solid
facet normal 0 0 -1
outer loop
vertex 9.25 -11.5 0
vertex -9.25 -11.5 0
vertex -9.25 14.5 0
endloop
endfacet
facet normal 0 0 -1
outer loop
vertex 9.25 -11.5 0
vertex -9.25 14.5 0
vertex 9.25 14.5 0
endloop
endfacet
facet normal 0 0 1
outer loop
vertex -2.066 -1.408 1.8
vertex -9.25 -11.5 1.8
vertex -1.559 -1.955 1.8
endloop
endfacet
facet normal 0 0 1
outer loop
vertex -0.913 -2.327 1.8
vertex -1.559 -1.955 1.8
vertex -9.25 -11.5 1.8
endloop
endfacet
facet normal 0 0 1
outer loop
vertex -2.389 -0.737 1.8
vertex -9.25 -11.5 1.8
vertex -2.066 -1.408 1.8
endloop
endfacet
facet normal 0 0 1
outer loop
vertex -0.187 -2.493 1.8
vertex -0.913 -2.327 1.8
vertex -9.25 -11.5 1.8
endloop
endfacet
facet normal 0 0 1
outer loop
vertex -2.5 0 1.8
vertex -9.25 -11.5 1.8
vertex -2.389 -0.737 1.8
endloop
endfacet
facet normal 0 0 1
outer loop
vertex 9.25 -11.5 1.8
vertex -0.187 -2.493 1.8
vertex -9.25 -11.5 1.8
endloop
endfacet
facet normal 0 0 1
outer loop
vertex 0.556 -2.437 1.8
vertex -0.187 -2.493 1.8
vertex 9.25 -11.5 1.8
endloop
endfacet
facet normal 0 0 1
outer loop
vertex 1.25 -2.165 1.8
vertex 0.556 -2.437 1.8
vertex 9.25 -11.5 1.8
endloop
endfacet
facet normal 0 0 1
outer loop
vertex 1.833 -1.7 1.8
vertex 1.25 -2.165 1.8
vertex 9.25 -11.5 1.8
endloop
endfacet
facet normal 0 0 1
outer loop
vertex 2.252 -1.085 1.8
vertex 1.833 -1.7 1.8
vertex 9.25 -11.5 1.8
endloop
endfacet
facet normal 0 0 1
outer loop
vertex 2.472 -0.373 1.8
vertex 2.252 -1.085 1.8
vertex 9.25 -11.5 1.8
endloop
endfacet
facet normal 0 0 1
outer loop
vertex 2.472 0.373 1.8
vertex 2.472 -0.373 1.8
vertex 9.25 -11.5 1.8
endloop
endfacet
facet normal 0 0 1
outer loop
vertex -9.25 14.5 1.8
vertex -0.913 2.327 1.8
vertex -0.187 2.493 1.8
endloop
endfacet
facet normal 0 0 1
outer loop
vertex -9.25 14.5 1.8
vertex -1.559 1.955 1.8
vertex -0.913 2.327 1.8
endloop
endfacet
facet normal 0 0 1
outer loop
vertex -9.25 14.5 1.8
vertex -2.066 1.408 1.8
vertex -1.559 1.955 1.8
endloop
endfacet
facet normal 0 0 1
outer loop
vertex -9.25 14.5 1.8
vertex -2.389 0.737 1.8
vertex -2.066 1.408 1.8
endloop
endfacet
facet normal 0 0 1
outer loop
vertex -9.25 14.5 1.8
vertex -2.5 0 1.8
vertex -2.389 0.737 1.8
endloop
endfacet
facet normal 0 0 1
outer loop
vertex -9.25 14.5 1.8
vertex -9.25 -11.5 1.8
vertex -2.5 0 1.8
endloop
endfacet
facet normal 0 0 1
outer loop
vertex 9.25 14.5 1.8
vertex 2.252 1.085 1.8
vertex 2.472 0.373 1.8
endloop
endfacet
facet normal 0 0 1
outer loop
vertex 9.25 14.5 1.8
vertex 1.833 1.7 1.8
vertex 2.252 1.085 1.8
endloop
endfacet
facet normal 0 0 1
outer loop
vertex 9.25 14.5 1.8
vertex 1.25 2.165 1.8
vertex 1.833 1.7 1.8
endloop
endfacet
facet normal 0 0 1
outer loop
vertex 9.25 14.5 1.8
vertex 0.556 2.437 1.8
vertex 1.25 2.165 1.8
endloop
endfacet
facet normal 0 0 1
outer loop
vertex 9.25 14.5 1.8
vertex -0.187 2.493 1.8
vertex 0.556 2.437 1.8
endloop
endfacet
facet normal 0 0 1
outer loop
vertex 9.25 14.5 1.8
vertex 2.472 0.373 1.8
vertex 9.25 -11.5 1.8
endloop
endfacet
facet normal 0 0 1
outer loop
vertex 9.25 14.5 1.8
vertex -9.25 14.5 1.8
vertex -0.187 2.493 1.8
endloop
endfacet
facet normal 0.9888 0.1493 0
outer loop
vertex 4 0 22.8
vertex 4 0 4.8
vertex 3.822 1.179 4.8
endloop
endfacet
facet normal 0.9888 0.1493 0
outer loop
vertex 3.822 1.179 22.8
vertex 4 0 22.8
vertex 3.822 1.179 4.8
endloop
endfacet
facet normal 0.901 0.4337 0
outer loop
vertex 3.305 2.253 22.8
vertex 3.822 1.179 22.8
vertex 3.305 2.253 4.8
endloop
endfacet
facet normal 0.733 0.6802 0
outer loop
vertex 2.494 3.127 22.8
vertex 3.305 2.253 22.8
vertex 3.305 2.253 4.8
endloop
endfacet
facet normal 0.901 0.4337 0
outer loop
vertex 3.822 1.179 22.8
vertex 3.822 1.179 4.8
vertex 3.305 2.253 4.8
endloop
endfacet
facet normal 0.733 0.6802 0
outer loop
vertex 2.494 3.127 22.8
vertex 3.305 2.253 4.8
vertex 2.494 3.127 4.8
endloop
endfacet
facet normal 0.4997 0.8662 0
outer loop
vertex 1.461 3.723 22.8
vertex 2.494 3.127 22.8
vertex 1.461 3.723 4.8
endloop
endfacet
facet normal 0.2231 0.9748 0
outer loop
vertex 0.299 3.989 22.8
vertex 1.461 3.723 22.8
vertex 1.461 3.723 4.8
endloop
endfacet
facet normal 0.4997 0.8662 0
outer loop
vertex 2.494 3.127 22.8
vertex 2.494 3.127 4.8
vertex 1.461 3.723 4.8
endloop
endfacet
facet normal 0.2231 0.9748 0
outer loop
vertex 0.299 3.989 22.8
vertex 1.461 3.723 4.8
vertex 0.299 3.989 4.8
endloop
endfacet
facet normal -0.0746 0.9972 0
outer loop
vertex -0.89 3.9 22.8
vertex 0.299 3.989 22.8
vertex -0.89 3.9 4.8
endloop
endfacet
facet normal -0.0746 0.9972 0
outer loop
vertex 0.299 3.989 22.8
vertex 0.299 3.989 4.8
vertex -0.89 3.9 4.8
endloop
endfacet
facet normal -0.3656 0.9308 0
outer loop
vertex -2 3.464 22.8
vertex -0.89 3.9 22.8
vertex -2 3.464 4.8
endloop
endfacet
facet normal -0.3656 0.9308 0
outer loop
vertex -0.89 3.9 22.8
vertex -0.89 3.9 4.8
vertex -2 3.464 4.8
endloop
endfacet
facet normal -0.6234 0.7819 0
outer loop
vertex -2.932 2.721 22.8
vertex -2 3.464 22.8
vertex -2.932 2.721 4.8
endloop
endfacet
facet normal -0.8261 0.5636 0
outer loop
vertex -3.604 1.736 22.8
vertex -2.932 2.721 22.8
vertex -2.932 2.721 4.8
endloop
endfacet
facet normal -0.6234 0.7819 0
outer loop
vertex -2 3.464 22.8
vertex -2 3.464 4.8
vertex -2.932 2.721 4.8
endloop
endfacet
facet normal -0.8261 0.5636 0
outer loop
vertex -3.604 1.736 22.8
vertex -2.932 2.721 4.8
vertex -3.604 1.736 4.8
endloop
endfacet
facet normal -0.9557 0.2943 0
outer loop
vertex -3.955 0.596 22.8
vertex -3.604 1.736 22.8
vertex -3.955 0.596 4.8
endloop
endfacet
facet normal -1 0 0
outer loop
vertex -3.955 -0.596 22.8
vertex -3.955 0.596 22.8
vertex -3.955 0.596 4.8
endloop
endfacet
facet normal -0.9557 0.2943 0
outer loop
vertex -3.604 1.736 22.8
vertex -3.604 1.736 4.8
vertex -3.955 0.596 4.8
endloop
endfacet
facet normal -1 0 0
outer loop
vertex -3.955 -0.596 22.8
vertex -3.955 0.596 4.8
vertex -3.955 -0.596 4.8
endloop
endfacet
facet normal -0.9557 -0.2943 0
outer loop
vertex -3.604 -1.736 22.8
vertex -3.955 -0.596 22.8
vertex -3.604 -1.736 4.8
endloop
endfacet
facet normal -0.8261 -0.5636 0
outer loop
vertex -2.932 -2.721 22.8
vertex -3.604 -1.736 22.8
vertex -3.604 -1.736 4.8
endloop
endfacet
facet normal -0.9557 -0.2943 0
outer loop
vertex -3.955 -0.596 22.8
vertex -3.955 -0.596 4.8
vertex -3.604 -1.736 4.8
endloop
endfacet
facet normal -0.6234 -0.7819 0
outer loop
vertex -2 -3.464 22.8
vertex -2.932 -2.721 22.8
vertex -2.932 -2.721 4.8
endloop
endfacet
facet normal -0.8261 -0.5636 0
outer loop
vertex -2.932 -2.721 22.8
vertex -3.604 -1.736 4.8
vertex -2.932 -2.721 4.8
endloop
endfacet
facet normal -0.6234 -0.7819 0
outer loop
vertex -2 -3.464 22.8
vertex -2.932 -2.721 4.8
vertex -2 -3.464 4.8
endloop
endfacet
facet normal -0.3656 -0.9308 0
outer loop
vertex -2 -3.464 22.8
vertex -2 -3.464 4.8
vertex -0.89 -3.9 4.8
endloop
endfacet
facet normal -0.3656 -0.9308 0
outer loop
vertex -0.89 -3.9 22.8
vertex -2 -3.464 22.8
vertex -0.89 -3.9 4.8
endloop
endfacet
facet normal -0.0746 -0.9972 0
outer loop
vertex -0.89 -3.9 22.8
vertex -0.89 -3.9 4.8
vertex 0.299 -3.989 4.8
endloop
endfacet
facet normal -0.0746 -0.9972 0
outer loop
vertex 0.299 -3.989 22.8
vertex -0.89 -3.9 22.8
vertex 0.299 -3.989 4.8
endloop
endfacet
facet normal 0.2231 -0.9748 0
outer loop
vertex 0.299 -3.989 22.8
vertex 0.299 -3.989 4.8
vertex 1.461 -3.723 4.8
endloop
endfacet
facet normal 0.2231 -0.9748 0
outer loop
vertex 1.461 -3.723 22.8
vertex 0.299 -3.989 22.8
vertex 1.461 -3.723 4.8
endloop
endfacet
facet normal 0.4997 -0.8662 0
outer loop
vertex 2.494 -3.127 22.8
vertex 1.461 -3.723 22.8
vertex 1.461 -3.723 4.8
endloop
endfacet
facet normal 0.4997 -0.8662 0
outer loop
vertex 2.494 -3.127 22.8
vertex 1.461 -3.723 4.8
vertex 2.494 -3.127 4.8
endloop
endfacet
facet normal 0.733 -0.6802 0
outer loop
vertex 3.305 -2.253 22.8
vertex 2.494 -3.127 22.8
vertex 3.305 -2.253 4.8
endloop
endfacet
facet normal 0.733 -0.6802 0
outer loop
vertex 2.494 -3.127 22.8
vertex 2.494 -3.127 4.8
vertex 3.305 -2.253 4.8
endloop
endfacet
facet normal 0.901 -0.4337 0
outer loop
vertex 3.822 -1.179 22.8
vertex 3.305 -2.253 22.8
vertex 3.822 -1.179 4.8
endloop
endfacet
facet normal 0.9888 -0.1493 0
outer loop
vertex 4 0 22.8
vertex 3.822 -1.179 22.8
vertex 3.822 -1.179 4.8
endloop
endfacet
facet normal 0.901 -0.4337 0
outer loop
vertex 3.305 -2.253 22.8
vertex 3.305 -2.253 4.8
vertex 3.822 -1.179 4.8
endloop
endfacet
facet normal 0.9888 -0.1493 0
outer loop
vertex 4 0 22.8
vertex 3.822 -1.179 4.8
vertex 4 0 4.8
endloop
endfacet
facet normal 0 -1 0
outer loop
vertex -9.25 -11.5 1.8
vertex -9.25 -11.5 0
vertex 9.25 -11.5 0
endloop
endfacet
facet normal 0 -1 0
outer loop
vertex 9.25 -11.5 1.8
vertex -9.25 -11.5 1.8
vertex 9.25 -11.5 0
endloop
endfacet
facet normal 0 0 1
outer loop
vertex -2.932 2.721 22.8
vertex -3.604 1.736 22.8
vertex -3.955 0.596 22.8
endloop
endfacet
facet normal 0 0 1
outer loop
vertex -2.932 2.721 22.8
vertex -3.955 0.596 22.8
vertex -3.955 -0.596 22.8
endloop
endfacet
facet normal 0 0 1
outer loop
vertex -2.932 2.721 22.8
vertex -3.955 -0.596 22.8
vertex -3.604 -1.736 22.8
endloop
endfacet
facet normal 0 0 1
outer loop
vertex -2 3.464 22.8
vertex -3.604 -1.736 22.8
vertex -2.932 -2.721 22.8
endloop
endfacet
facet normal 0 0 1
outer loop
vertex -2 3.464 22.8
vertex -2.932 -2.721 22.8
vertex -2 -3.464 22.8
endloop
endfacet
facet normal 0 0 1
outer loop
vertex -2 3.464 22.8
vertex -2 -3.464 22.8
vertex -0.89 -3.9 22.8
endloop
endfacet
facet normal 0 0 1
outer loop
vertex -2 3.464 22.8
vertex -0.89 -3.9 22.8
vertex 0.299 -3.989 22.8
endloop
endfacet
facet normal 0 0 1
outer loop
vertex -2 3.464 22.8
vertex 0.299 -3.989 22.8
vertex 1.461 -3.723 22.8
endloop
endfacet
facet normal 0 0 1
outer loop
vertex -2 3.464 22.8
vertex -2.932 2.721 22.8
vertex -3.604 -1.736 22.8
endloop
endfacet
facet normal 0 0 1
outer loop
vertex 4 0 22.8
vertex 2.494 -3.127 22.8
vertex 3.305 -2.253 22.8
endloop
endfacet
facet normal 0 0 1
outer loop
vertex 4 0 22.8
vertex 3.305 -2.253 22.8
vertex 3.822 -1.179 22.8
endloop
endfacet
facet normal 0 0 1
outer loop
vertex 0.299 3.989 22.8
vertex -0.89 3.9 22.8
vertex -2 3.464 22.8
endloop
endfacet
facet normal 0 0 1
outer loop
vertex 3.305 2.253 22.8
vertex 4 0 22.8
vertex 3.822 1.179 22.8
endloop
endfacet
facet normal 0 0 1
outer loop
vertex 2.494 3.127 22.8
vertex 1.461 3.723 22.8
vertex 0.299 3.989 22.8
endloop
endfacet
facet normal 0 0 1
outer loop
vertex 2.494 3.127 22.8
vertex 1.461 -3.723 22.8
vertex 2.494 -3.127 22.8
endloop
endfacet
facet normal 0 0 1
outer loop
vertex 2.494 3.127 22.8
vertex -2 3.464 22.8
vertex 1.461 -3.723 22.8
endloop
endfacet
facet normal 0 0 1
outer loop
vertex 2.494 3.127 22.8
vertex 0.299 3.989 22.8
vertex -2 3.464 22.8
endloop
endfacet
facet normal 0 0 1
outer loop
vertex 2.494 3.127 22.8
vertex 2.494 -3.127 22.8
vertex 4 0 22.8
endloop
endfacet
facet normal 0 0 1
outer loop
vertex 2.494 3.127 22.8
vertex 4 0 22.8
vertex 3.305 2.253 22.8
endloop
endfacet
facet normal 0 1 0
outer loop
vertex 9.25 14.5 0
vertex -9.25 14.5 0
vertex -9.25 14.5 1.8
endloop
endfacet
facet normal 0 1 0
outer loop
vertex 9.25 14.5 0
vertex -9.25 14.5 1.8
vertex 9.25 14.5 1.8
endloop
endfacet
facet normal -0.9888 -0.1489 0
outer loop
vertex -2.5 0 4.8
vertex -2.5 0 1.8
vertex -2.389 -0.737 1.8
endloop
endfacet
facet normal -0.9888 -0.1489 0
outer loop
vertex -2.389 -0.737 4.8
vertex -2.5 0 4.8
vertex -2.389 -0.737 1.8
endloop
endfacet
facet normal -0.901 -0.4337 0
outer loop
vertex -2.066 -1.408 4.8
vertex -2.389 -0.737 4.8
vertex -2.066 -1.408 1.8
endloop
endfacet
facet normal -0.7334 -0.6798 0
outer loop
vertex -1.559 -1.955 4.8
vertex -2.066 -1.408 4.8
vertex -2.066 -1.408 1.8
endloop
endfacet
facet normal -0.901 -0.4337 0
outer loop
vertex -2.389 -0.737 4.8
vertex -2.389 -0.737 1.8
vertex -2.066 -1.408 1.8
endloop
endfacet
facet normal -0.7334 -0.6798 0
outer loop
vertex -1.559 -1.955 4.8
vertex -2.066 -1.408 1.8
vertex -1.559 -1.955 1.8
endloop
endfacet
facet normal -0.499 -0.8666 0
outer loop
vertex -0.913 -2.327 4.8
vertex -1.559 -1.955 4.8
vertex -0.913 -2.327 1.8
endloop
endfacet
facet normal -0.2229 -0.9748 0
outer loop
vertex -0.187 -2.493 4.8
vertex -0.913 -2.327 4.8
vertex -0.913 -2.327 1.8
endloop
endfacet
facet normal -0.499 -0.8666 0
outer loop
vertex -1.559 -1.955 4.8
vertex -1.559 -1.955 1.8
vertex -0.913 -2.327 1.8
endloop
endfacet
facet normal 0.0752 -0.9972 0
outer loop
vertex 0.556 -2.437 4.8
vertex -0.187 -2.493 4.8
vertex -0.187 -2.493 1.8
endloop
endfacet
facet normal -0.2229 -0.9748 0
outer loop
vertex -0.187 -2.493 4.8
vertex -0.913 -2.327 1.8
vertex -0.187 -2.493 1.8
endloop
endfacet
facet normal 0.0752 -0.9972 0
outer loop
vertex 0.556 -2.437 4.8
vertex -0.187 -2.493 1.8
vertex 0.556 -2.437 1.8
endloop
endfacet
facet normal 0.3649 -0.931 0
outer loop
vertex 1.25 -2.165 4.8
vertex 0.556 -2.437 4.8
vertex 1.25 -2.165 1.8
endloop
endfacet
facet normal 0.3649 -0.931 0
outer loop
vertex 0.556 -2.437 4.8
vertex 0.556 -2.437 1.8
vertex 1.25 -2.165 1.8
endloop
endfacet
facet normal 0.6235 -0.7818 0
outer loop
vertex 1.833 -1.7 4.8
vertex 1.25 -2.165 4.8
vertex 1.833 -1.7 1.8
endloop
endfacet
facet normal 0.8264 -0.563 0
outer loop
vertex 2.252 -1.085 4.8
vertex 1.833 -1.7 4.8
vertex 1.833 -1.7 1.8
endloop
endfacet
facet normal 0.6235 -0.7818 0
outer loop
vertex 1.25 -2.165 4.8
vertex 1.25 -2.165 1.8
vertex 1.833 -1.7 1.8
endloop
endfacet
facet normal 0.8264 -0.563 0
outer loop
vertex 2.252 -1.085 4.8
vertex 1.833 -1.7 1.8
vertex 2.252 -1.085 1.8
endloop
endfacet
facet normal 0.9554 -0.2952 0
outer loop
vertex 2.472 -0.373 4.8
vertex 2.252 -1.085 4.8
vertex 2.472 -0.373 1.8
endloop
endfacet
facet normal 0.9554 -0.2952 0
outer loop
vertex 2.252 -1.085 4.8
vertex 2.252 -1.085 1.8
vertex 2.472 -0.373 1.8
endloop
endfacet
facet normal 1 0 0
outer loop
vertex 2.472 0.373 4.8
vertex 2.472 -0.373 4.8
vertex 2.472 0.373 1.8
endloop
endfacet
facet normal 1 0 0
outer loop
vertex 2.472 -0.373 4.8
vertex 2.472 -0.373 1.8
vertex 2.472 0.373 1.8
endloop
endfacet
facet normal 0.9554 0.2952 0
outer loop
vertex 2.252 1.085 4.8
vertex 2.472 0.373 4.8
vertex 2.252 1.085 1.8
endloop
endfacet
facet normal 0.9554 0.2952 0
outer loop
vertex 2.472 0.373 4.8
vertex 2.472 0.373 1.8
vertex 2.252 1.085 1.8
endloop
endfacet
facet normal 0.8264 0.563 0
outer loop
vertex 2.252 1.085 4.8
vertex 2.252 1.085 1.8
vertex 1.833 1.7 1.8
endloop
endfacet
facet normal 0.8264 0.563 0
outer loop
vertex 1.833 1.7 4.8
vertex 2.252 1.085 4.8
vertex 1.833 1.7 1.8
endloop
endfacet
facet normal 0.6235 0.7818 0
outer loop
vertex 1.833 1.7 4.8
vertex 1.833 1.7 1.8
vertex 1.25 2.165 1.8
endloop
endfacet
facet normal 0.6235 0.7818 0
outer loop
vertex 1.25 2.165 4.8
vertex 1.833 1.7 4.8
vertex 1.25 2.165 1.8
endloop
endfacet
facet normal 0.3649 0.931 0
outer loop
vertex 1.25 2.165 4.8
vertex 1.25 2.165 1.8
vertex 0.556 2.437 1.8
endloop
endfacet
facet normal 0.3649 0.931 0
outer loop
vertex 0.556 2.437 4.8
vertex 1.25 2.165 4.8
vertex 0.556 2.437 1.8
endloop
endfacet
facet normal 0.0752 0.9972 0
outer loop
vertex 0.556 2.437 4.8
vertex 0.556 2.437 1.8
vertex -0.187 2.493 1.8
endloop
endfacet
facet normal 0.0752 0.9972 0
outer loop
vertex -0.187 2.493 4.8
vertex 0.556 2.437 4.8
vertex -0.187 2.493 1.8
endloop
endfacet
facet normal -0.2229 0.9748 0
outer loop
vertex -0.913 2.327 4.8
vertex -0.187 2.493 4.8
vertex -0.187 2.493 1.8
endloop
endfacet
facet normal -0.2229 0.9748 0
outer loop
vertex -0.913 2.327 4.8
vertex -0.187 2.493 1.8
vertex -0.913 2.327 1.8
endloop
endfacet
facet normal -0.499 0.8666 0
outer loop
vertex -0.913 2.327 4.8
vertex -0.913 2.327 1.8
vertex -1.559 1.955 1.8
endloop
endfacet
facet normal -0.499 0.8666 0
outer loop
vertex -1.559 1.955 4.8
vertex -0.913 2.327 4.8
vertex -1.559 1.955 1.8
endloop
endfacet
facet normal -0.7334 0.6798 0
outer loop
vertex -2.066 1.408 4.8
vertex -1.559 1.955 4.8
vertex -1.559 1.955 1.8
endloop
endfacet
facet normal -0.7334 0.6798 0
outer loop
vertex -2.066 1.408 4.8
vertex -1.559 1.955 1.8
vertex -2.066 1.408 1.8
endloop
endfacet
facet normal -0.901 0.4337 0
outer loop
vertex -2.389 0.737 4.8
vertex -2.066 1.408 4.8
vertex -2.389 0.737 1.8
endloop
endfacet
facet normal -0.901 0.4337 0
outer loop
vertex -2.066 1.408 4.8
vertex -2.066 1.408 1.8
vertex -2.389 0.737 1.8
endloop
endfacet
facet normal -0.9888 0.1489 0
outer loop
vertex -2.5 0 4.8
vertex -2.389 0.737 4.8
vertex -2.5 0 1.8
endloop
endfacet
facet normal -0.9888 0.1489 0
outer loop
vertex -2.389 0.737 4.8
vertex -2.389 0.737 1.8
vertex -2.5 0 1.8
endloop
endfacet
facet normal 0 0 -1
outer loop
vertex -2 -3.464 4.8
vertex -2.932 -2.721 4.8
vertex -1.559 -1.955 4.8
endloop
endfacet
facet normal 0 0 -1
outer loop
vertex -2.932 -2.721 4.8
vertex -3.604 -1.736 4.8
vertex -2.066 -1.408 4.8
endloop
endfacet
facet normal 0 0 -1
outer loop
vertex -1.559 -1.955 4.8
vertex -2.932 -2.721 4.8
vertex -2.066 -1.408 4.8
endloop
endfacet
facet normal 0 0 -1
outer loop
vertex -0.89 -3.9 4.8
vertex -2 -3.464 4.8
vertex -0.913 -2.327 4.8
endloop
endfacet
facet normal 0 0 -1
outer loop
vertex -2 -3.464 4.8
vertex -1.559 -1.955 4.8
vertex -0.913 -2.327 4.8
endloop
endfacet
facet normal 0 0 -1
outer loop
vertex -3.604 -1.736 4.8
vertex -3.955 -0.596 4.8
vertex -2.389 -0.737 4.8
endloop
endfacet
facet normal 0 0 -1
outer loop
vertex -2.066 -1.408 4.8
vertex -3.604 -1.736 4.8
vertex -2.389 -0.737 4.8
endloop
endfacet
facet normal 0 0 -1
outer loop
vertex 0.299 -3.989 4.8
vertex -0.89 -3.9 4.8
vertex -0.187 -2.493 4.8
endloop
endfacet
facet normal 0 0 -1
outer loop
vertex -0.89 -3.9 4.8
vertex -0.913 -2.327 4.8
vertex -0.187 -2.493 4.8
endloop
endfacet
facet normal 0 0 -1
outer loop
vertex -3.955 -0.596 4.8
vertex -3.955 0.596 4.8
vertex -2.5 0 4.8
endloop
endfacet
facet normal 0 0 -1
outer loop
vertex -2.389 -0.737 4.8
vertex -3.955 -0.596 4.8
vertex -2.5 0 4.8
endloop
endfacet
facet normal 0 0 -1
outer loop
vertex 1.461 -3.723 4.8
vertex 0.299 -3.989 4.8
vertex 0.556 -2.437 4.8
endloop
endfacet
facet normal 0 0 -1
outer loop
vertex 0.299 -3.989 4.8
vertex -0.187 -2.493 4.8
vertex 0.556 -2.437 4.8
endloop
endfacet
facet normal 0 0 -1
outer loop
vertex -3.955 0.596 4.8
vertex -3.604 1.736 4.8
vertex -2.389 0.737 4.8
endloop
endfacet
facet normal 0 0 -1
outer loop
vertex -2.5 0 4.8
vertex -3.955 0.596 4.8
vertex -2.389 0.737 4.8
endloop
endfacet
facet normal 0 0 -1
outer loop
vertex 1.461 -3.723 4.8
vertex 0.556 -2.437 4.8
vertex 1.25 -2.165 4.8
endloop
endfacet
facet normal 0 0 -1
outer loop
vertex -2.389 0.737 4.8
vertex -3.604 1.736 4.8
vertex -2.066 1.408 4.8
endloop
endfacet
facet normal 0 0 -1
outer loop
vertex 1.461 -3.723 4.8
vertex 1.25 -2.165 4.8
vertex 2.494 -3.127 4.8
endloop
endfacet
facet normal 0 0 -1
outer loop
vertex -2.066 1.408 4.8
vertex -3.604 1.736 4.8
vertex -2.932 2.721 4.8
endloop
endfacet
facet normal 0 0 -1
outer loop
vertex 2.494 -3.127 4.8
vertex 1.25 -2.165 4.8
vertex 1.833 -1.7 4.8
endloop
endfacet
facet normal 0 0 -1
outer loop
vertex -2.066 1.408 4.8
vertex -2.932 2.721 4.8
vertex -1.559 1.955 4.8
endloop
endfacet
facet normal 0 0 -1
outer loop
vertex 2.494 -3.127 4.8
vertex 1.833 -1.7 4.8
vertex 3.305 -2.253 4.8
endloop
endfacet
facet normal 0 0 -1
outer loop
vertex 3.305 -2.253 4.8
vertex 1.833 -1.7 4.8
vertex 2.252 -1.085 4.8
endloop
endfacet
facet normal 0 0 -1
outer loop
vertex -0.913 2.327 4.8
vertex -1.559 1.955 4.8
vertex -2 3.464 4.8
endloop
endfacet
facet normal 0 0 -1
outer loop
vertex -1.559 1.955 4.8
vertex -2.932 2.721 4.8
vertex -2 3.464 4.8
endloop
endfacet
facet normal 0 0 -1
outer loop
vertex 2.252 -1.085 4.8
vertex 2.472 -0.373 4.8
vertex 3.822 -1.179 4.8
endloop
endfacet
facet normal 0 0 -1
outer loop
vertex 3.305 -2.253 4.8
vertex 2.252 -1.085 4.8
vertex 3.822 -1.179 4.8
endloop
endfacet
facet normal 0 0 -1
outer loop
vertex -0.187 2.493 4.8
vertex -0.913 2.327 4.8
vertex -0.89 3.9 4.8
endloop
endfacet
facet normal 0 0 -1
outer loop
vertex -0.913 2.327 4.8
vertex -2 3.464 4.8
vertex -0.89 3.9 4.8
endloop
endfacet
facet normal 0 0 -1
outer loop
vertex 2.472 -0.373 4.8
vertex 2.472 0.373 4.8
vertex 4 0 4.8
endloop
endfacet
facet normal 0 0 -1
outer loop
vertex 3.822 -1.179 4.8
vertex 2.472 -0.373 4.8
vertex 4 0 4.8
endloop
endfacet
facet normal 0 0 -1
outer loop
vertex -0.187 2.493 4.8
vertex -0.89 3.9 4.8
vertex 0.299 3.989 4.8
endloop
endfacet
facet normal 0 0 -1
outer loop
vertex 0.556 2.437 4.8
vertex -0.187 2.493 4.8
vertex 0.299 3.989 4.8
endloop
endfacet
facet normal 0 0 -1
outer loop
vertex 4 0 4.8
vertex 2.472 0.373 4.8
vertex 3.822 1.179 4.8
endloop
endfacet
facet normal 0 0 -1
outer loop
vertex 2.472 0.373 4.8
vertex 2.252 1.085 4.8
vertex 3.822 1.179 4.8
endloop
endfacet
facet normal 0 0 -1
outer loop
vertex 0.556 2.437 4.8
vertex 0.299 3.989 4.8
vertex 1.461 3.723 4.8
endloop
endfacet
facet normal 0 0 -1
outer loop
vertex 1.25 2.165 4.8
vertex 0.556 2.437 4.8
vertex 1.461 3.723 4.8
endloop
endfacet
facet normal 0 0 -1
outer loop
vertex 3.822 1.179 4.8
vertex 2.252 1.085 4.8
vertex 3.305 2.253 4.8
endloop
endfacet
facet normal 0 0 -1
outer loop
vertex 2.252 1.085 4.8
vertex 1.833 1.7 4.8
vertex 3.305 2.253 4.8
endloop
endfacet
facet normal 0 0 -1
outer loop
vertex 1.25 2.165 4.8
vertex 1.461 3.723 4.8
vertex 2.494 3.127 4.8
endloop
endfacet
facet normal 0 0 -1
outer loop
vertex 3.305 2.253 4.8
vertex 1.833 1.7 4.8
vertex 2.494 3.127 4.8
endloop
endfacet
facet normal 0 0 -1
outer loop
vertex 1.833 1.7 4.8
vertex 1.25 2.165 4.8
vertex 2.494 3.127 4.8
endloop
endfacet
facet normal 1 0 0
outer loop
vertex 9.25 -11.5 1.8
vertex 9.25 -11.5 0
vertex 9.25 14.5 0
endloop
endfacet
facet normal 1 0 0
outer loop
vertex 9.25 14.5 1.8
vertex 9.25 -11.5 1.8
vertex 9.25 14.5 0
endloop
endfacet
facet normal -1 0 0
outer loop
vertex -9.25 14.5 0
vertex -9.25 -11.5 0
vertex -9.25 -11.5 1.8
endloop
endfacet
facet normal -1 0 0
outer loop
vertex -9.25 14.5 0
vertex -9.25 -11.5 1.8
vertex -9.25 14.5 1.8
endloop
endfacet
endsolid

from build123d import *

# Parameters (mm, degrees)
SKETCH1_W           = 18.5
SKETCH1_H           = 26
BOSS_EXTRUDE1_DEPTH = 1.8
SKETCH2_R           = 2.5
BOSS_EXTRUDE2_DEPTH = 3
SKETCH3_R           = 4
BOSS_EXTRUDE3_DEPTH = 18


with BuildPart() as part:
    # Sketch1 → Boss-Extrude1 (new body)
    with BuildSketch(Plane.XY):
        with Locations((0, 1.5)):
            Rectangle(SKETCH1_W, SKETCH1_H)
    extrude(amount=BOSS_EXTRUDE1_DEPTH)

    # Sketch2 → Boss-Extrude2 (add)
    with BuildSketch(Plane.XY.offset(1.8)):
        Circle(SKETCH2_R)
    extrude(amount=BOSS_EXTRUDE2_DEPTH)

    # Sketch3 → Boss-Extrude3 (add)
    with BuildSketch(Plane.XY.offset(4.8)):
        Circle(SKETCH3_R)
    extrude(amount=BOSS_EXTRUDE3_DEPTH)


solid = part.part
